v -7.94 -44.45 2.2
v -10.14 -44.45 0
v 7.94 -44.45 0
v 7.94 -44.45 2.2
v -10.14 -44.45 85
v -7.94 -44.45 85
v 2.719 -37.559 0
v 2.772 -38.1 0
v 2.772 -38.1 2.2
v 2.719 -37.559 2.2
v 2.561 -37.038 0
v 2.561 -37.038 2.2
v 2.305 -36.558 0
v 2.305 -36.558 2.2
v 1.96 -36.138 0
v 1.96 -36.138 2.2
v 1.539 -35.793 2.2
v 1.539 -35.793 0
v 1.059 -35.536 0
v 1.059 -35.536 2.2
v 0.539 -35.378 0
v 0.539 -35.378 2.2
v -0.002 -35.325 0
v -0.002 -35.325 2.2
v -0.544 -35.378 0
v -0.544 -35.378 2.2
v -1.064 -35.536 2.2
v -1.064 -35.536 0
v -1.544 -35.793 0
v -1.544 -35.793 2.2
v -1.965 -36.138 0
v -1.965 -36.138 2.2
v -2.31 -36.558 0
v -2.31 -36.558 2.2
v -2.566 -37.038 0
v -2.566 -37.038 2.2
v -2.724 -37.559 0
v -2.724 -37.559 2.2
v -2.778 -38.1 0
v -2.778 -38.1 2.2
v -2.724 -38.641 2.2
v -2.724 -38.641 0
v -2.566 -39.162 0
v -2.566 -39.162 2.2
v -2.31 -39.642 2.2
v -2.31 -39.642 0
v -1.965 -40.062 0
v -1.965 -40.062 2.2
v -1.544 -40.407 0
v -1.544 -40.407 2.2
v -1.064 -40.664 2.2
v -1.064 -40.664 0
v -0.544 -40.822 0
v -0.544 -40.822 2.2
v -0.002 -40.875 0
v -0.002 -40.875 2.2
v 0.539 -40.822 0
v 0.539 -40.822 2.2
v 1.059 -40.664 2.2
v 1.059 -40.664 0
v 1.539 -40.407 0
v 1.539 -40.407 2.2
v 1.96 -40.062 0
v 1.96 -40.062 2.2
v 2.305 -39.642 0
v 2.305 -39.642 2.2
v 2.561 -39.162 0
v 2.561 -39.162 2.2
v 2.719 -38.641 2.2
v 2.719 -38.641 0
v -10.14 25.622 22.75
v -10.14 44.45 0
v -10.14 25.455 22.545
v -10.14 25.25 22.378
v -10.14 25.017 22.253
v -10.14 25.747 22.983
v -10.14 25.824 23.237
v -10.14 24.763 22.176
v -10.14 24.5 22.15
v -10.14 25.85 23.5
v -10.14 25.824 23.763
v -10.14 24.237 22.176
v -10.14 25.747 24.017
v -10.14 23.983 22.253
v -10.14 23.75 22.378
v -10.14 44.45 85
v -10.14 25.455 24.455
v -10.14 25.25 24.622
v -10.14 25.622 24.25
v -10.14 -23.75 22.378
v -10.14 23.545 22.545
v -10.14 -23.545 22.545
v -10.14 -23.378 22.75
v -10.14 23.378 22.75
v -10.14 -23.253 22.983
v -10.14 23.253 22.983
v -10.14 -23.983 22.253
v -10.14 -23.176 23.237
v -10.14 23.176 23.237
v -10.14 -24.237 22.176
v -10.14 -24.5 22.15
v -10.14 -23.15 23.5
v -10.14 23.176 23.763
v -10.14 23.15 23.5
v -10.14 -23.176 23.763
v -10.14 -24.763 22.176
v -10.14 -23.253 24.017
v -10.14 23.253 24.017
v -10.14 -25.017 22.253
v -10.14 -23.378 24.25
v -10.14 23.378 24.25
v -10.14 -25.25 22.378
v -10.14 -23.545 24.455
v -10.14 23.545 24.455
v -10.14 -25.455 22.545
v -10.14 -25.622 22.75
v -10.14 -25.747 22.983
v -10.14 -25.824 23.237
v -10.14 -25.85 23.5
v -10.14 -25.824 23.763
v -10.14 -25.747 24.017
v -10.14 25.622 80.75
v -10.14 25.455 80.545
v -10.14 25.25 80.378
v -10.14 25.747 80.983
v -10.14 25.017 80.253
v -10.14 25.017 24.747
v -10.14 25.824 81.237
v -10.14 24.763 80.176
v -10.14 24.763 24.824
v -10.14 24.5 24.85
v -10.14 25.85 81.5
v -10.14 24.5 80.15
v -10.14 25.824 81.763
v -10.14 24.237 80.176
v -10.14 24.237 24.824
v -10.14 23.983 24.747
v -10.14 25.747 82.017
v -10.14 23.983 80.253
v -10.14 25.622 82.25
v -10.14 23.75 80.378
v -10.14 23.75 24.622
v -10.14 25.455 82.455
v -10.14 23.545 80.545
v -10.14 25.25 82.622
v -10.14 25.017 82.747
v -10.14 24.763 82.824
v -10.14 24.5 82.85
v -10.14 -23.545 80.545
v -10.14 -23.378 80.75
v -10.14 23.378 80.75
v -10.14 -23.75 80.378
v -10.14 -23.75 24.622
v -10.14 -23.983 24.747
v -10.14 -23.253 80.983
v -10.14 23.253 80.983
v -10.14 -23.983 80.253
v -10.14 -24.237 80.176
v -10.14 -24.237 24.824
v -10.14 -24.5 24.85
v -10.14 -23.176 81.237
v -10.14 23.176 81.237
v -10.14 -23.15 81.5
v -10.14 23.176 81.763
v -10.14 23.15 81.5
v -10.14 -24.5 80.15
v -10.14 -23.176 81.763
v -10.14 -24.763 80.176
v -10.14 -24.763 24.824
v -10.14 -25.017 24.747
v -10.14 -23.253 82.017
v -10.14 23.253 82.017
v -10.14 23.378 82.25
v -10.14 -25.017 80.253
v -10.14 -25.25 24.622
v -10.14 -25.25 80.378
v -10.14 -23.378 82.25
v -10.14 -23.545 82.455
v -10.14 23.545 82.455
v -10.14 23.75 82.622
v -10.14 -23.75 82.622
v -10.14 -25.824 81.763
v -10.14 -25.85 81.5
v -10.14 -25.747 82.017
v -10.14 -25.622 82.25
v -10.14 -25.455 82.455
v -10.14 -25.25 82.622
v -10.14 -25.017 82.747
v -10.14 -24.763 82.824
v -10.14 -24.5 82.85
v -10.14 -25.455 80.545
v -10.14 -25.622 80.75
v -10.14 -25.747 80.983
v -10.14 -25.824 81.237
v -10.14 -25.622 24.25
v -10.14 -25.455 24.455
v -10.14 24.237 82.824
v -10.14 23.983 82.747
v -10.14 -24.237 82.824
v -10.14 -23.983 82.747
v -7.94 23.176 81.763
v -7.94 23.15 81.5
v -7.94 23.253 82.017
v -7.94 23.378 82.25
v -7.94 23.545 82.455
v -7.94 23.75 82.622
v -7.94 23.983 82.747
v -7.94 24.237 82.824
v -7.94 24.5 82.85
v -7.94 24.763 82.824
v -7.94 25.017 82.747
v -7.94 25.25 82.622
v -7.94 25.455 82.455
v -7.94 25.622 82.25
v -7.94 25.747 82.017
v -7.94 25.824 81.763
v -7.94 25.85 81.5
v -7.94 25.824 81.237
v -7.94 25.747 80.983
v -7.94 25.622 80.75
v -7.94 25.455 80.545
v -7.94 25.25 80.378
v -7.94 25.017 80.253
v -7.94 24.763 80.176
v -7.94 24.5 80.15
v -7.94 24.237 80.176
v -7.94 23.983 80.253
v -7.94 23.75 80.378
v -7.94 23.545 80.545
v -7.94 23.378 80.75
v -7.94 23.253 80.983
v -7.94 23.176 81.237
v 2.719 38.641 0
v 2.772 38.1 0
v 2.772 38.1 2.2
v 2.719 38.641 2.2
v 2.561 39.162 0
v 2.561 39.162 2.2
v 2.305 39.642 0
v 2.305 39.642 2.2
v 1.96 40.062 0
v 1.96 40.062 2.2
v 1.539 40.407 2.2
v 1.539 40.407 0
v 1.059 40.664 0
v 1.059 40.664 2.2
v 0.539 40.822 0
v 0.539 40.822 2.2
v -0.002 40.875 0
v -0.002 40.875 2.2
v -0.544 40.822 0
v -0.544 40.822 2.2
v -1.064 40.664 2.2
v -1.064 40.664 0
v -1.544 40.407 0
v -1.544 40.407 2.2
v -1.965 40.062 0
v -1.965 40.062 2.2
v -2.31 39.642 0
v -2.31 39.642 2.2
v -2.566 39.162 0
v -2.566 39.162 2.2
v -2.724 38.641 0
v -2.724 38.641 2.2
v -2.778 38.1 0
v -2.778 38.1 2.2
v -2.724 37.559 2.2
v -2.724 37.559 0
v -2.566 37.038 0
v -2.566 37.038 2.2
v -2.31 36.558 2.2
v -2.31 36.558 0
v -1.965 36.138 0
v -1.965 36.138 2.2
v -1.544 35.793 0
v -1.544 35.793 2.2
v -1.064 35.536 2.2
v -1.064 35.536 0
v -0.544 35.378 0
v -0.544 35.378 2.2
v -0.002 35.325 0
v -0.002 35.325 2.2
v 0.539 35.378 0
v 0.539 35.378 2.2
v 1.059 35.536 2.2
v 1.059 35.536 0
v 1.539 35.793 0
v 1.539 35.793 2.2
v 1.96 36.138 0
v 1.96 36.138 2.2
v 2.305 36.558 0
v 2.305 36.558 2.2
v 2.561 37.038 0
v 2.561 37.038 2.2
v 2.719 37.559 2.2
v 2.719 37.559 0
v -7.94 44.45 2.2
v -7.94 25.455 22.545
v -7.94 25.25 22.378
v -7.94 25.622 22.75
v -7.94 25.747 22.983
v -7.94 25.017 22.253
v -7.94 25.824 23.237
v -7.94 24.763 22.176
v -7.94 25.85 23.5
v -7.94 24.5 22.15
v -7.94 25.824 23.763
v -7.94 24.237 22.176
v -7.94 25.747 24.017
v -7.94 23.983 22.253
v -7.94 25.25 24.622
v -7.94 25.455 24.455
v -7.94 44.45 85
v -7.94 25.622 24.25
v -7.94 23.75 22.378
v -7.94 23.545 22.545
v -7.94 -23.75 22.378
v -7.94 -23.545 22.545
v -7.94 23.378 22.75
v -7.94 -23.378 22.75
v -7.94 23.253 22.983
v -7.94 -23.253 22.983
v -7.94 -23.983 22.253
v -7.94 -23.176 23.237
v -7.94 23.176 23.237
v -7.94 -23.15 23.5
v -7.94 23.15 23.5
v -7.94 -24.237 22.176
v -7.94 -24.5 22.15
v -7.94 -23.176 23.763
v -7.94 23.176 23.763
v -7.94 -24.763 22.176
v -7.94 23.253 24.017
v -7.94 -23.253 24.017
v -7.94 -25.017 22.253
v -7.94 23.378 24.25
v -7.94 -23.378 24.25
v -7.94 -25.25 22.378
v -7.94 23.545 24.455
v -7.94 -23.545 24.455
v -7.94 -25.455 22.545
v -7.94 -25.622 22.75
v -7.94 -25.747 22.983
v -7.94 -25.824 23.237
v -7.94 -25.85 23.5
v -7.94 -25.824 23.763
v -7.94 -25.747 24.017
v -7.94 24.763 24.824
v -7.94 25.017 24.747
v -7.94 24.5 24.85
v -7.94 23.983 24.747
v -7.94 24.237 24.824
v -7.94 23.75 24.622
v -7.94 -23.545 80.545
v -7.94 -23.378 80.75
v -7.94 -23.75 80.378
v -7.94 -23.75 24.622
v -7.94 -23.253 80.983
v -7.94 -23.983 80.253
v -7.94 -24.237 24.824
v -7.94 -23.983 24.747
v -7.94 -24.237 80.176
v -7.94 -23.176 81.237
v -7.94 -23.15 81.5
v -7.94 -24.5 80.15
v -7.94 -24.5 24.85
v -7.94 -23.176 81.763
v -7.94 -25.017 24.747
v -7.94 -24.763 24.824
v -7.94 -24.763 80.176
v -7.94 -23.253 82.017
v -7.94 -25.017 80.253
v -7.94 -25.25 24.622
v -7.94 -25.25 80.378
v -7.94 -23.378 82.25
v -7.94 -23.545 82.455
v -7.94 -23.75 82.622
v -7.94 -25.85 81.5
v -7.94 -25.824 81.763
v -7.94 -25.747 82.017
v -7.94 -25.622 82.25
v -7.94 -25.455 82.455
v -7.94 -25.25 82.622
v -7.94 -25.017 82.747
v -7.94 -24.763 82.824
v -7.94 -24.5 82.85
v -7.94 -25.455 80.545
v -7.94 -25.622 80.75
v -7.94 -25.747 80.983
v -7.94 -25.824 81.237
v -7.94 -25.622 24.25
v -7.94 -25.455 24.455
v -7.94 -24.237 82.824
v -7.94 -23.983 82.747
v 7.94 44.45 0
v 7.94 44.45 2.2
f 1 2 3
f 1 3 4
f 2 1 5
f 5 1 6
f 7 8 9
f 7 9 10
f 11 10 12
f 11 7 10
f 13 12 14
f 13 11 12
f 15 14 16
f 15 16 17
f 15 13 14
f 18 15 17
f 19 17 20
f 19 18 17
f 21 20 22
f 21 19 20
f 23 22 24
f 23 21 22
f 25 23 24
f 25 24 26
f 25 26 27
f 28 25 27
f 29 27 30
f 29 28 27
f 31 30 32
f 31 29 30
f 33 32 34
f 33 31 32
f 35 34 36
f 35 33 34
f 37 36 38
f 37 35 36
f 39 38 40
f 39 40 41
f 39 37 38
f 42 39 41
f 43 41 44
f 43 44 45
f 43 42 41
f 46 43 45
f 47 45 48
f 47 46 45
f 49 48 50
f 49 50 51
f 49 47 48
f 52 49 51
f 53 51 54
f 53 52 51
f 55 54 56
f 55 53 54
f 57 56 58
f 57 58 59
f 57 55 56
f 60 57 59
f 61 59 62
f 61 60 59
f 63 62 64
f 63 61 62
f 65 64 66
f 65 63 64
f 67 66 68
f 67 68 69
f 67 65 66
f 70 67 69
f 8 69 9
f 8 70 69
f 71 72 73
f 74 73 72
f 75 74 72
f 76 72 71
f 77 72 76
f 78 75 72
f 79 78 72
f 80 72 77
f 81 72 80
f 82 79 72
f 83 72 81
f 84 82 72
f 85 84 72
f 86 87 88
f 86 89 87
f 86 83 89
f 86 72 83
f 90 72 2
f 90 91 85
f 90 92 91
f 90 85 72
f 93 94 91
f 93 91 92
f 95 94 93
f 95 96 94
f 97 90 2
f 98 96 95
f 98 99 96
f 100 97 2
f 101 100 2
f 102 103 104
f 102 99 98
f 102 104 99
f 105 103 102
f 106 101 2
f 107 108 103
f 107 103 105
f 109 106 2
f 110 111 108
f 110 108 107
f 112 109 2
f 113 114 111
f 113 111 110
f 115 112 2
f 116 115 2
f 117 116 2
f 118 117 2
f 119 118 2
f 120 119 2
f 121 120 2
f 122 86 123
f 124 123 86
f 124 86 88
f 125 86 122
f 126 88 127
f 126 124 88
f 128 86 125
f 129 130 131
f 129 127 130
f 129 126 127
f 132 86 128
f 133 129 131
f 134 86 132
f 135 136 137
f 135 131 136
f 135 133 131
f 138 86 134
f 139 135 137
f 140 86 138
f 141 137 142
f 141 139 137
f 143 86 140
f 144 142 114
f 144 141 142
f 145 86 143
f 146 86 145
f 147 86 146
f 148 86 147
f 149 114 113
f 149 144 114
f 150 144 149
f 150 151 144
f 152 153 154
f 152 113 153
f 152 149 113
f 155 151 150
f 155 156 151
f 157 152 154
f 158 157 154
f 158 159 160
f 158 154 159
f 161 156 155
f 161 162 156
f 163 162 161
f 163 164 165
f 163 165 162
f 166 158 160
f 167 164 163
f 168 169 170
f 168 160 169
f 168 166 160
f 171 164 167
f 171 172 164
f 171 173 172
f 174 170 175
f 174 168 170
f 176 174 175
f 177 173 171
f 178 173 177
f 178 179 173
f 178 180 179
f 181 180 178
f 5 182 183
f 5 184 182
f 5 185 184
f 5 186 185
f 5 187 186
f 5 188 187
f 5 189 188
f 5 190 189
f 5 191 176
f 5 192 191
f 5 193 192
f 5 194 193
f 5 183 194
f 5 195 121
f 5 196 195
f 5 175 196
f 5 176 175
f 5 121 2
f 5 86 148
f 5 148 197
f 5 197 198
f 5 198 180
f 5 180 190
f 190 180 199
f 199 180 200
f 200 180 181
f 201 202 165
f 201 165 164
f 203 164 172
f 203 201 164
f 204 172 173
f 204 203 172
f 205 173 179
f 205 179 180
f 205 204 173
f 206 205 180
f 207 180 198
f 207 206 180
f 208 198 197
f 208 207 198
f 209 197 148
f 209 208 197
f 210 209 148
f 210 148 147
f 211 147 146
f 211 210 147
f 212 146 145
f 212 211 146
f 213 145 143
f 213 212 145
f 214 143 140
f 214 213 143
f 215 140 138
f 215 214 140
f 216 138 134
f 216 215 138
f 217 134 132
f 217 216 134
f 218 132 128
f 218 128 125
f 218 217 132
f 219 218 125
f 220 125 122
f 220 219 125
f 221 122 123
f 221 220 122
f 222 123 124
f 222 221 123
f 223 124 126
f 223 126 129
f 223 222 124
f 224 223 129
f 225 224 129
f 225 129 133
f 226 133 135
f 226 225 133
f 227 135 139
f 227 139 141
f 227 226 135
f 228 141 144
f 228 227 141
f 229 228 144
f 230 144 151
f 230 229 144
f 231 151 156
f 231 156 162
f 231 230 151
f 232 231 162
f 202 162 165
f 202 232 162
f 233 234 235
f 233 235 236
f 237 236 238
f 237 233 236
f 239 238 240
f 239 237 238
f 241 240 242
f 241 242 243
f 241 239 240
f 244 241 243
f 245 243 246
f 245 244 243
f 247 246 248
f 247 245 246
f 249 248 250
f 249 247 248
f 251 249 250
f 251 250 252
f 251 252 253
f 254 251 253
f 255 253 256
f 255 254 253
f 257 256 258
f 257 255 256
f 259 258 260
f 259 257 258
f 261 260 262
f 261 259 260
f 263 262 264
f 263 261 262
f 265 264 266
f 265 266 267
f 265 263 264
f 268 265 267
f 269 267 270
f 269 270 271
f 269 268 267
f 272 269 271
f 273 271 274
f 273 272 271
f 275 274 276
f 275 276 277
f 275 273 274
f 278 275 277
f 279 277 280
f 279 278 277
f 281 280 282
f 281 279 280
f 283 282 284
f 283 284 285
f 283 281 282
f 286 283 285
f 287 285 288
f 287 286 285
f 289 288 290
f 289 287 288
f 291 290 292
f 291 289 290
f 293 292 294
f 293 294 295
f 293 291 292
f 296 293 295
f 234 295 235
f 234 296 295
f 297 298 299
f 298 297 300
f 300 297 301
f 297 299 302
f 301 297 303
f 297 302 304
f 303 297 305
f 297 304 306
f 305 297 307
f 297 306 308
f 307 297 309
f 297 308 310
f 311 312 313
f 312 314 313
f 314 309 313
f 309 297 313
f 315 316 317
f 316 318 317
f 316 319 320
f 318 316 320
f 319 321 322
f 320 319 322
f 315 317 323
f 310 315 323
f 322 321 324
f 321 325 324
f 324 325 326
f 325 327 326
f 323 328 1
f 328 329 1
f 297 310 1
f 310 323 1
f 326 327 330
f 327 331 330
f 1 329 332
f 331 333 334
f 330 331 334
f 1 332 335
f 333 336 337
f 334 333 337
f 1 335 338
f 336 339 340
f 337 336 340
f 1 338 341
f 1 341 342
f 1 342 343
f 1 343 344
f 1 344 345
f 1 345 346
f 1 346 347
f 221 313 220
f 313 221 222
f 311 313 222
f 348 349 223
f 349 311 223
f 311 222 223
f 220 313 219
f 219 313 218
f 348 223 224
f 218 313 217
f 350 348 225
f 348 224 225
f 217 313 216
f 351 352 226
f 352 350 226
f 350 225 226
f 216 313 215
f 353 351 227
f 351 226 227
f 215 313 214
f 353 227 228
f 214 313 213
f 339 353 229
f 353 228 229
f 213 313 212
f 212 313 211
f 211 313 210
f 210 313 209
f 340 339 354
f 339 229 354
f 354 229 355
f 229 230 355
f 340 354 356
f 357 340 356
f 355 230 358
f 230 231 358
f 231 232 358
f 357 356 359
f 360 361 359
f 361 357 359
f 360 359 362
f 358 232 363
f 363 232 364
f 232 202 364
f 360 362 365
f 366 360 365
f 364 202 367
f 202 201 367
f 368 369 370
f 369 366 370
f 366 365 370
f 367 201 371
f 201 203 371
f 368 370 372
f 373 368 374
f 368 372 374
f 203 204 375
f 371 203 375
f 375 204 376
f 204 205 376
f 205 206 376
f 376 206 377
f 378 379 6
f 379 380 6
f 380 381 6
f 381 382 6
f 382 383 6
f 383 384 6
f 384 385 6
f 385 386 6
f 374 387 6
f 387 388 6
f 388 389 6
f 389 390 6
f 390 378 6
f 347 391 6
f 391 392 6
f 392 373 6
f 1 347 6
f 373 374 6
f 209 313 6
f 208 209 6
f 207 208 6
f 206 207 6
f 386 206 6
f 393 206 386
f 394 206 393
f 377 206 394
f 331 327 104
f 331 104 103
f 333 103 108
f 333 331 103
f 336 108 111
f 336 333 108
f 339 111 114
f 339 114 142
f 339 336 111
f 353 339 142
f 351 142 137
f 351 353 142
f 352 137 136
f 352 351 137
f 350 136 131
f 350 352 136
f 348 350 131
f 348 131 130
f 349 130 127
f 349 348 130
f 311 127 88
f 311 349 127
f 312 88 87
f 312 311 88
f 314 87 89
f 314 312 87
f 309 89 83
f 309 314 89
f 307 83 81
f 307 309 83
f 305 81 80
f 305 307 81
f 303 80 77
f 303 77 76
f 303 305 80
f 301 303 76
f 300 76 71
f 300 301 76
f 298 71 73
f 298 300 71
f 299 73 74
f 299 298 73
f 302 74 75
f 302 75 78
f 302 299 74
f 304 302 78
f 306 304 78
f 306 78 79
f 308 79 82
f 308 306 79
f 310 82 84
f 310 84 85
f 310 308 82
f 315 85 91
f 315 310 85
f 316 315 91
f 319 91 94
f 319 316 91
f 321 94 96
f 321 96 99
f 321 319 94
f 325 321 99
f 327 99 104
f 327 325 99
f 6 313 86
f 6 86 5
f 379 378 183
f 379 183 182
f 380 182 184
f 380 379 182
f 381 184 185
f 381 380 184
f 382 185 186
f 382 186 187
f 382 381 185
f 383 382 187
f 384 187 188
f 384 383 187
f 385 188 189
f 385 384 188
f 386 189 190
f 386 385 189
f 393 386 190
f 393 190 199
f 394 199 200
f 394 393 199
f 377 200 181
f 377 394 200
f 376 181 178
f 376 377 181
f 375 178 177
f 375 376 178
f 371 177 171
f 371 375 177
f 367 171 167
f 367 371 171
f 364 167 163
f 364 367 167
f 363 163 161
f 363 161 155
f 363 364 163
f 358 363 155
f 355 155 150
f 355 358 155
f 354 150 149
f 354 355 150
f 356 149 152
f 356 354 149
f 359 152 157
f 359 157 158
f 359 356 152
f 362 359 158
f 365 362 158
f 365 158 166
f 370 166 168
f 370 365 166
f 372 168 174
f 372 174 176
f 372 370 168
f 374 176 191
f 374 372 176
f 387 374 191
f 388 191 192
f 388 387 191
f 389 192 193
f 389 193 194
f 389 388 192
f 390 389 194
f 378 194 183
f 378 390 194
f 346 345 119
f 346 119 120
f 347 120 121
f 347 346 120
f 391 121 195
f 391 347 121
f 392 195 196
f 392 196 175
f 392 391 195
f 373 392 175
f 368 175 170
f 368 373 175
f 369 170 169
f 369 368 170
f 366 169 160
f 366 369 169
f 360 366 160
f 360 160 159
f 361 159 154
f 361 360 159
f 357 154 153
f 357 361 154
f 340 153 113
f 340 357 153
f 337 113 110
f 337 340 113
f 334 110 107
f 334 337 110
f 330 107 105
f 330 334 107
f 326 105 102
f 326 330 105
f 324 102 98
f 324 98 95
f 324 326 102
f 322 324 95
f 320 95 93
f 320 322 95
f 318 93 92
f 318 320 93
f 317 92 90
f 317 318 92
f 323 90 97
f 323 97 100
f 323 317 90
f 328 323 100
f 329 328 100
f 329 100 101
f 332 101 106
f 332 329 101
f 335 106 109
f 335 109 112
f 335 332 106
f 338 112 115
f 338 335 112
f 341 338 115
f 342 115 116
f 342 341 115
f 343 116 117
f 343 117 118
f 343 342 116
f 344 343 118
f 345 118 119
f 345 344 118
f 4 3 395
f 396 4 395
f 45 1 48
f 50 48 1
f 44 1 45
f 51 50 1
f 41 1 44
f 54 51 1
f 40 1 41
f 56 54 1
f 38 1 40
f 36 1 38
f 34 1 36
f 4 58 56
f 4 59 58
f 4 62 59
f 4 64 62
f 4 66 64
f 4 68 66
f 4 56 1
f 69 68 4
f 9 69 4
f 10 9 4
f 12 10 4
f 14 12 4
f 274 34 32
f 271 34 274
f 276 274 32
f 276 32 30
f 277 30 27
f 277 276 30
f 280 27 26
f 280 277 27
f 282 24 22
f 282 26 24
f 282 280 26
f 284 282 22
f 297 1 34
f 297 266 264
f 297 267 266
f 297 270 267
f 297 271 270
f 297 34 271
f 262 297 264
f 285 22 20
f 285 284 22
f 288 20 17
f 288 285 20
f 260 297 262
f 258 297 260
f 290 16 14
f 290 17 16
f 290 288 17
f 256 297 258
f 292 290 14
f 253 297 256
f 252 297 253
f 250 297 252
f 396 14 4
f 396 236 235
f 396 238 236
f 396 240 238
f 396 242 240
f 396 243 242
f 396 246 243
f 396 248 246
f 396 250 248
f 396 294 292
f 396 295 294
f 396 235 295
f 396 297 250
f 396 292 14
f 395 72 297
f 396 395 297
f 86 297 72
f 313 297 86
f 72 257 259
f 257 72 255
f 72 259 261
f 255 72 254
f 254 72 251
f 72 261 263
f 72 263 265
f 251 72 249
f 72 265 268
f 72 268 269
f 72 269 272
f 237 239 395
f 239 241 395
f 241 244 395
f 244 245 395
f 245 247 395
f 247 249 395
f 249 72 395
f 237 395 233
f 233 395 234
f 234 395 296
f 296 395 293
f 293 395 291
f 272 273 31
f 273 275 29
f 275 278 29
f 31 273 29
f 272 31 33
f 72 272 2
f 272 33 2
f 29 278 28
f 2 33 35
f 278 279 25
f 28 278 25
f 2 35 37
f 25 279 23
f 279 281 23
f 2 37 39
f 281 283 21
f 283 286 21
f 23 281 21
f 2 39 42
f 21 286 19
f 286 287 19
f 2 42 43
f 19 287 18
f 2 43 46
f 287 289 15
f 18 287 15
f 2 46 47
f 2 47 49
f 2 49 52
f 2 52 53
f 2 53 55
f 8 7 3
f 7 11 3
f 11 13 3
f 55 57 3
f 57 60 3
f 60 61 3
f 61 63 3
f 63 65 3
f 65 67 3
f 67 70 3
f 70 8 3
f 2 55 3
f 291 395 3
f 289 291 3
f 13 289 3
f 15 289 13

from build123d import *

# Parameters (mm, degrees)
SKETCH_W     = 15.88
SKETCH_H     = 88.9
SKETCH_R     = 2.775
PAD_DEPTH    = 2.2
SKETCH001_W  = 88.9
SKETCH001_H  = 85
SKETCH001_R  = 1.35
PAD001_DEPTH = 2.2


with BuildPart() as part:
    # Sketch → Pad (new body)
    with BuildSketch(Plane.XY):
        Rectangle(SKETCH_W, SKETCH_H)
        with Locations((-0.0025, 38.1)):
            Circle(SKETCH_R, mode=Mode.SUBTRACT)
        with Locations((-0.0025, -38.1)):
            Circle(SKETCH_R, mode=Mode.SUBTRACT)
    extrude(amount=PAD_DEPTH)

    # Sketch001 (on Face4 of Pad) → Pad001 (join)
    with BuildSketch(Plane(origin=(-7.94, 0, 0), x_dir=(0, -1, 0), z_dir=(-1, 0, 0))):
        with Locations((0, 42.5)):
            Rectangle(SKETCH001_W, SKETCH001_H)
        with Locations((-24.5, 23.5)):
            Circle(SKETCH001_R, mode=Mode.SUBTRACT)
        with Locations((24.5, 23.5)):
            Circle(SKETCH001_R, mode=Mode.SUBTRACT)
        with Locations((24.5, 81.5)):
            Circle(SKETCH001_R, mode=Mode.SUBTRACT)
        with Locations((-24.5, 81.5)):
            Circle(SKETCH001_R, mode=Mode.SUBTRACT)
    extrude(amount=PAD001_DEPTH)


solid = part.part
